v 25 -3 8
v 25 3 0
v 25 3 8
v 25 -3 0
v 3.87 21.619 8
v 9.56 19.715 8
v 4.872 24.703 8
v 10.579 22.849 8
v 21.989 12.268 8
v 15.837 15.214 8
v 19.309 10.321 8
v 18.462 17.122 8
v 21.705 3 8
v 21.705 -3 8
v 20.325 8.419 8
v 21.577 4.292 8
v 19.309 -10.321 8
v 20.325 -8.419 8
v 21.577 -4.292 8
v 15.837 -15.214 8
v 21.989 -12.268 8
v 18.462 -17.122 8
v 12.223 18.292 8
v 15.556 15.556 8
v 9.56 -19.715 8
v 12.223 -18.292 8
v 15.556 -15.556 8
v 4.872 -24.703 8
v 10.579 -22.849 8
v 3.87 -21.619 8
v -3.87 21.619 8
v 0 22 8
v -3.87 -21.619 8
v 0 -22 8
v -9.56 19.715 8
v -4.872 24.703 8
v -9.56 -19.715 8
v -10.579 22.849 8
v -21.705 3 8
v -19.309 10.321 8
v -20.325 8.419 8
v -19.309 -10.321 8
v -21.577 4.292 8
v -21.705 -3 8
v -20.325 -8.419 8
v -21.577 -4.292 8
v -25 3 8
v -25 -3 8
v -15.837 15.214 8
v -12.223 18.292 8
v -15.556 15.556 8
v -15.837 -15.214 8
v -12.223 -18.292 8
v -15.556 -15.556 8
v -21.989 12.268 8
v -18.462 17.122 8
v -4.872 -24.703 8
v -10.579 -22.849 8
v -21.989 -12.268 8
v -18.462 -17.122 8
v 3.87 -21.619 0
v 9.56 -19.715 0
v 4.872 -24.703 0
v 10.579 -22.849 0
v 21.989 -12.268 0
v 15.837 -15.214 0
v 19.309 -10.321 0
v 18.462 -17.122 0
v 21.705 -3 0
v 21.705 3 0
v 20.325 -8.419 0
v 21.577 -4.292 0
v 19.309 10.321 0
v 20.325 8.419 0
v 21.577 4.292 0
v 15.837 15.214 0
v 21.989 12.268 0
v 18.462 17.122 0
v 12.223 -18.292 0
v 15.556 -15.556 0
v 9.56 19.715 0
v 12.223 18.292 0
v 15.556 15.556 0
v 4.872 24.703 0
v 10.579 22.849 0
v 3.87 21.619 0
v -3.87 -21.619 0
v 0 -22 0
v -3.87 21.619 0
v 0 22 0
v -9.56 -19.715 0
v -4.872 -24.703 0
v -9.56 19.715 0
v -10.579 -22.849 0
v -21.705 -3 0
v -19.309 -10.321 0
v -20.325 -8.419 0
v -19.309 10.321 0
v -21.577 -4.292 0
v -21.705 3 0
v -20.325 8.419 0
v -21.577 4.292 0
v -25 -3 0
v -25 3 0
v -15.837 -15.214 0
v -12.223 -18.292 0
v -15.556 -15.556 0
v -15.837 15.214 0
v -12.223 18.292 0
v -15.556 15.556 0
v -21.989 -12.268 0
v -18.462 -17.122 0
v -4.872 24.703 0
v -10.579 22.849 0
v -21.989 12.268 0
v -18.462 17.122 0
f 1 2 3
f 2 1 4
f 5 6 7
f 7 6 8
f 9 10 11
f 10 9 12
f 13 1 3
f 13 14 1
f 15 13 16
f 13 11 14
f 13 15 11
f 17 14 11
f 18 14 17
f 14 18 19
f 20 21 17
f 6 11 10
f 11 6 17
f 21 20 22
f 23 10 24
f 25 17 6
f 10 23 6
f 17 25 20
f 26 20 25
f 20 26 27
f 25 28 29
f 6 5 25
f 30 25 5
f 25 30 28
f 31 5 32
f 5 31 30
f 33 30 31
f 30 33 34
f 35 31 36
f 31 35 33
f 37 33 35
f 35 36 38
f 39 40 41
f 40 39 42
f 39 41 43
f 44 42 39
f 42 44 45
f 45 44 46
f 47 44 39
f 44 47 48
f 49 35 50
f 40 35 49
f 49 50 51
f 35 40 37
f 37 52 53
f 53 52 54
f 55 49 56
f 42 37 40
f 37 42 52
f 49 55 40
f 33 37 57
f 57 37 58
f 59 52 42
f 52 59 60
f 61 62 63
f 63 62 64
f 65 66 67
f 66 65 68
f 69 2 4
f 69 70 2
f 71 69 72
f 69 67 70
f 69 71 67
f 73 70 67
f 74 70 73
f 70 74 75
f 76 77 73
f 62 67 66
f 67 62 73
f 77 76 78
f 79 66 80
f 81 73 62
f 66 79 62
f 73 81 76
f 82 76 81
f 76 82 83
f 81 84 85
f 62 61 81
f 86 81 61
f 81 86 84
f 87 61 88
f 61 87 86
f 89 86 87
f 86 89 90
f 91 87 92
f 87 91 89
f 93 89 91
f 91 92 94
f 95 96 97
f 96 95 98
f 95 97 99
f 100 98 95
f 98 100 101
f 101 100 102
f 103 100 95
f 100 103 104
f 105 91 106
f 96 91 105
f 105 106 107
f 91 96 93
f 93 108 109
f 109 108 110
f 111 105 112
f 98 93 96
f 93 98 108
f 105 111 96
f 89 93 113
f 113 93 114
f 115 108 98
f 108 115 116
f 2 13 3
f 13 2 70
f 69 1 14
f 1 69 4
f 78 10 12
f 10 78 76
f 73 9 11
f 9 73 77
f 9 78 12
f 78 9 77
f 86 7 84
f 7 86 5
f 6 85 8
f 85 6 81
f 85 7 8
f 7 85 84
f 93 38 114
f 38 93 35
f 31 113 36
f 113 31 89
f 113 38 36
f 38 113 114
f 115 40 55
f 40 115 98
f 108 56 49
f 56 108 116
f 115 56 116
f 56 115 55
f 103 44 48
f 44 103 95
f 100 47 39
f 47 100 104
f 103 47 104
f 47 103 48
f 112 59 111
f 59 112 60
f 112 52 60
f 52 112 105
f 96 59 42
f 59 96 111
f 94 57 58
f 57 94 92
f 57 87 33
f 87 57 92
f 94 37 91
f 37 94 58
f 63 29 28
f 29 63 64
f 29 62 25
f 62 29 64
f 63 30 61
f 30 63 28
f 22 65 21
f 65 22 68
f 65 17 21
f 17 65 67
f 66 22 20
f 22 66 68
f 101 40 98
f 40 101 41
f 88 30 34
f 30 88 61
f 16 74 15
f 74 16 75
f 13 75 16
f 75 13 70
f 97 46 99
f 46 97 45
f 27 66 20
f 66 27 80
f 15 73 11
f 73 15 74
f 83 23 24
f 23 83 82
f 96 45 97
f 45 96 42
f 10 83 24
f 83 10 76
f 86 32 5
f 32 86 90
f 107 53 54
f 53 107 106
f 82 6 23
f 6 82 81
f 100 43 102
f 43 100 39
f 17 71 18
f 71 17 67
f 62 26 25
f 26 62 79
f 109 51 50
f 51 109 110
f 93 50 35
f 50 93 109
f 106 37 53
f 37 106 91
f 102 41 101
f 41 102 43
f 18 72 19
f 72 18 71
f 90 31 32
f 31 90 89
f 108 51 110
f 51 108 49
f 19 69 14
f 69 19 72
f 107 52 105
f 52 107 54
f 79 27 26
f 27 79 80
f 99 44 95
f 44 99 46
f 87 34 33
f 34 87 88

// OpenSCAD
$fn = 32;

// ----------------------------------------------------------------------
// Spur blank: plain gear blank
// ----------------------------------------------------------------------

// --- parameters (mm) ---
disc_r = 22;              // blank root radius
disc_t = 8;               // blank thickness
n_teeth = 10;             // stub tooth count
tooth_w = 6;              // tooth width at the root
tooth_h = 3;              // tooth height above the root

out_r = disc_r + tooth_h;  // tip radius
bbox_x = 50.0;  // measured width over the teeth
bbox_y = 49.41;  // measured depth over the teeth

union() {
  cylinder(r = disc_r, h = disc_t);
  for (i = [0 : n_teeth - 1])
    rotate([0, 0, i * 360 / n_teeth])
      translate([disc_r - 1, -tooth_w / 2, 0])
        cube([tooth_h + 1, tooth_w, disc_t]);
}
